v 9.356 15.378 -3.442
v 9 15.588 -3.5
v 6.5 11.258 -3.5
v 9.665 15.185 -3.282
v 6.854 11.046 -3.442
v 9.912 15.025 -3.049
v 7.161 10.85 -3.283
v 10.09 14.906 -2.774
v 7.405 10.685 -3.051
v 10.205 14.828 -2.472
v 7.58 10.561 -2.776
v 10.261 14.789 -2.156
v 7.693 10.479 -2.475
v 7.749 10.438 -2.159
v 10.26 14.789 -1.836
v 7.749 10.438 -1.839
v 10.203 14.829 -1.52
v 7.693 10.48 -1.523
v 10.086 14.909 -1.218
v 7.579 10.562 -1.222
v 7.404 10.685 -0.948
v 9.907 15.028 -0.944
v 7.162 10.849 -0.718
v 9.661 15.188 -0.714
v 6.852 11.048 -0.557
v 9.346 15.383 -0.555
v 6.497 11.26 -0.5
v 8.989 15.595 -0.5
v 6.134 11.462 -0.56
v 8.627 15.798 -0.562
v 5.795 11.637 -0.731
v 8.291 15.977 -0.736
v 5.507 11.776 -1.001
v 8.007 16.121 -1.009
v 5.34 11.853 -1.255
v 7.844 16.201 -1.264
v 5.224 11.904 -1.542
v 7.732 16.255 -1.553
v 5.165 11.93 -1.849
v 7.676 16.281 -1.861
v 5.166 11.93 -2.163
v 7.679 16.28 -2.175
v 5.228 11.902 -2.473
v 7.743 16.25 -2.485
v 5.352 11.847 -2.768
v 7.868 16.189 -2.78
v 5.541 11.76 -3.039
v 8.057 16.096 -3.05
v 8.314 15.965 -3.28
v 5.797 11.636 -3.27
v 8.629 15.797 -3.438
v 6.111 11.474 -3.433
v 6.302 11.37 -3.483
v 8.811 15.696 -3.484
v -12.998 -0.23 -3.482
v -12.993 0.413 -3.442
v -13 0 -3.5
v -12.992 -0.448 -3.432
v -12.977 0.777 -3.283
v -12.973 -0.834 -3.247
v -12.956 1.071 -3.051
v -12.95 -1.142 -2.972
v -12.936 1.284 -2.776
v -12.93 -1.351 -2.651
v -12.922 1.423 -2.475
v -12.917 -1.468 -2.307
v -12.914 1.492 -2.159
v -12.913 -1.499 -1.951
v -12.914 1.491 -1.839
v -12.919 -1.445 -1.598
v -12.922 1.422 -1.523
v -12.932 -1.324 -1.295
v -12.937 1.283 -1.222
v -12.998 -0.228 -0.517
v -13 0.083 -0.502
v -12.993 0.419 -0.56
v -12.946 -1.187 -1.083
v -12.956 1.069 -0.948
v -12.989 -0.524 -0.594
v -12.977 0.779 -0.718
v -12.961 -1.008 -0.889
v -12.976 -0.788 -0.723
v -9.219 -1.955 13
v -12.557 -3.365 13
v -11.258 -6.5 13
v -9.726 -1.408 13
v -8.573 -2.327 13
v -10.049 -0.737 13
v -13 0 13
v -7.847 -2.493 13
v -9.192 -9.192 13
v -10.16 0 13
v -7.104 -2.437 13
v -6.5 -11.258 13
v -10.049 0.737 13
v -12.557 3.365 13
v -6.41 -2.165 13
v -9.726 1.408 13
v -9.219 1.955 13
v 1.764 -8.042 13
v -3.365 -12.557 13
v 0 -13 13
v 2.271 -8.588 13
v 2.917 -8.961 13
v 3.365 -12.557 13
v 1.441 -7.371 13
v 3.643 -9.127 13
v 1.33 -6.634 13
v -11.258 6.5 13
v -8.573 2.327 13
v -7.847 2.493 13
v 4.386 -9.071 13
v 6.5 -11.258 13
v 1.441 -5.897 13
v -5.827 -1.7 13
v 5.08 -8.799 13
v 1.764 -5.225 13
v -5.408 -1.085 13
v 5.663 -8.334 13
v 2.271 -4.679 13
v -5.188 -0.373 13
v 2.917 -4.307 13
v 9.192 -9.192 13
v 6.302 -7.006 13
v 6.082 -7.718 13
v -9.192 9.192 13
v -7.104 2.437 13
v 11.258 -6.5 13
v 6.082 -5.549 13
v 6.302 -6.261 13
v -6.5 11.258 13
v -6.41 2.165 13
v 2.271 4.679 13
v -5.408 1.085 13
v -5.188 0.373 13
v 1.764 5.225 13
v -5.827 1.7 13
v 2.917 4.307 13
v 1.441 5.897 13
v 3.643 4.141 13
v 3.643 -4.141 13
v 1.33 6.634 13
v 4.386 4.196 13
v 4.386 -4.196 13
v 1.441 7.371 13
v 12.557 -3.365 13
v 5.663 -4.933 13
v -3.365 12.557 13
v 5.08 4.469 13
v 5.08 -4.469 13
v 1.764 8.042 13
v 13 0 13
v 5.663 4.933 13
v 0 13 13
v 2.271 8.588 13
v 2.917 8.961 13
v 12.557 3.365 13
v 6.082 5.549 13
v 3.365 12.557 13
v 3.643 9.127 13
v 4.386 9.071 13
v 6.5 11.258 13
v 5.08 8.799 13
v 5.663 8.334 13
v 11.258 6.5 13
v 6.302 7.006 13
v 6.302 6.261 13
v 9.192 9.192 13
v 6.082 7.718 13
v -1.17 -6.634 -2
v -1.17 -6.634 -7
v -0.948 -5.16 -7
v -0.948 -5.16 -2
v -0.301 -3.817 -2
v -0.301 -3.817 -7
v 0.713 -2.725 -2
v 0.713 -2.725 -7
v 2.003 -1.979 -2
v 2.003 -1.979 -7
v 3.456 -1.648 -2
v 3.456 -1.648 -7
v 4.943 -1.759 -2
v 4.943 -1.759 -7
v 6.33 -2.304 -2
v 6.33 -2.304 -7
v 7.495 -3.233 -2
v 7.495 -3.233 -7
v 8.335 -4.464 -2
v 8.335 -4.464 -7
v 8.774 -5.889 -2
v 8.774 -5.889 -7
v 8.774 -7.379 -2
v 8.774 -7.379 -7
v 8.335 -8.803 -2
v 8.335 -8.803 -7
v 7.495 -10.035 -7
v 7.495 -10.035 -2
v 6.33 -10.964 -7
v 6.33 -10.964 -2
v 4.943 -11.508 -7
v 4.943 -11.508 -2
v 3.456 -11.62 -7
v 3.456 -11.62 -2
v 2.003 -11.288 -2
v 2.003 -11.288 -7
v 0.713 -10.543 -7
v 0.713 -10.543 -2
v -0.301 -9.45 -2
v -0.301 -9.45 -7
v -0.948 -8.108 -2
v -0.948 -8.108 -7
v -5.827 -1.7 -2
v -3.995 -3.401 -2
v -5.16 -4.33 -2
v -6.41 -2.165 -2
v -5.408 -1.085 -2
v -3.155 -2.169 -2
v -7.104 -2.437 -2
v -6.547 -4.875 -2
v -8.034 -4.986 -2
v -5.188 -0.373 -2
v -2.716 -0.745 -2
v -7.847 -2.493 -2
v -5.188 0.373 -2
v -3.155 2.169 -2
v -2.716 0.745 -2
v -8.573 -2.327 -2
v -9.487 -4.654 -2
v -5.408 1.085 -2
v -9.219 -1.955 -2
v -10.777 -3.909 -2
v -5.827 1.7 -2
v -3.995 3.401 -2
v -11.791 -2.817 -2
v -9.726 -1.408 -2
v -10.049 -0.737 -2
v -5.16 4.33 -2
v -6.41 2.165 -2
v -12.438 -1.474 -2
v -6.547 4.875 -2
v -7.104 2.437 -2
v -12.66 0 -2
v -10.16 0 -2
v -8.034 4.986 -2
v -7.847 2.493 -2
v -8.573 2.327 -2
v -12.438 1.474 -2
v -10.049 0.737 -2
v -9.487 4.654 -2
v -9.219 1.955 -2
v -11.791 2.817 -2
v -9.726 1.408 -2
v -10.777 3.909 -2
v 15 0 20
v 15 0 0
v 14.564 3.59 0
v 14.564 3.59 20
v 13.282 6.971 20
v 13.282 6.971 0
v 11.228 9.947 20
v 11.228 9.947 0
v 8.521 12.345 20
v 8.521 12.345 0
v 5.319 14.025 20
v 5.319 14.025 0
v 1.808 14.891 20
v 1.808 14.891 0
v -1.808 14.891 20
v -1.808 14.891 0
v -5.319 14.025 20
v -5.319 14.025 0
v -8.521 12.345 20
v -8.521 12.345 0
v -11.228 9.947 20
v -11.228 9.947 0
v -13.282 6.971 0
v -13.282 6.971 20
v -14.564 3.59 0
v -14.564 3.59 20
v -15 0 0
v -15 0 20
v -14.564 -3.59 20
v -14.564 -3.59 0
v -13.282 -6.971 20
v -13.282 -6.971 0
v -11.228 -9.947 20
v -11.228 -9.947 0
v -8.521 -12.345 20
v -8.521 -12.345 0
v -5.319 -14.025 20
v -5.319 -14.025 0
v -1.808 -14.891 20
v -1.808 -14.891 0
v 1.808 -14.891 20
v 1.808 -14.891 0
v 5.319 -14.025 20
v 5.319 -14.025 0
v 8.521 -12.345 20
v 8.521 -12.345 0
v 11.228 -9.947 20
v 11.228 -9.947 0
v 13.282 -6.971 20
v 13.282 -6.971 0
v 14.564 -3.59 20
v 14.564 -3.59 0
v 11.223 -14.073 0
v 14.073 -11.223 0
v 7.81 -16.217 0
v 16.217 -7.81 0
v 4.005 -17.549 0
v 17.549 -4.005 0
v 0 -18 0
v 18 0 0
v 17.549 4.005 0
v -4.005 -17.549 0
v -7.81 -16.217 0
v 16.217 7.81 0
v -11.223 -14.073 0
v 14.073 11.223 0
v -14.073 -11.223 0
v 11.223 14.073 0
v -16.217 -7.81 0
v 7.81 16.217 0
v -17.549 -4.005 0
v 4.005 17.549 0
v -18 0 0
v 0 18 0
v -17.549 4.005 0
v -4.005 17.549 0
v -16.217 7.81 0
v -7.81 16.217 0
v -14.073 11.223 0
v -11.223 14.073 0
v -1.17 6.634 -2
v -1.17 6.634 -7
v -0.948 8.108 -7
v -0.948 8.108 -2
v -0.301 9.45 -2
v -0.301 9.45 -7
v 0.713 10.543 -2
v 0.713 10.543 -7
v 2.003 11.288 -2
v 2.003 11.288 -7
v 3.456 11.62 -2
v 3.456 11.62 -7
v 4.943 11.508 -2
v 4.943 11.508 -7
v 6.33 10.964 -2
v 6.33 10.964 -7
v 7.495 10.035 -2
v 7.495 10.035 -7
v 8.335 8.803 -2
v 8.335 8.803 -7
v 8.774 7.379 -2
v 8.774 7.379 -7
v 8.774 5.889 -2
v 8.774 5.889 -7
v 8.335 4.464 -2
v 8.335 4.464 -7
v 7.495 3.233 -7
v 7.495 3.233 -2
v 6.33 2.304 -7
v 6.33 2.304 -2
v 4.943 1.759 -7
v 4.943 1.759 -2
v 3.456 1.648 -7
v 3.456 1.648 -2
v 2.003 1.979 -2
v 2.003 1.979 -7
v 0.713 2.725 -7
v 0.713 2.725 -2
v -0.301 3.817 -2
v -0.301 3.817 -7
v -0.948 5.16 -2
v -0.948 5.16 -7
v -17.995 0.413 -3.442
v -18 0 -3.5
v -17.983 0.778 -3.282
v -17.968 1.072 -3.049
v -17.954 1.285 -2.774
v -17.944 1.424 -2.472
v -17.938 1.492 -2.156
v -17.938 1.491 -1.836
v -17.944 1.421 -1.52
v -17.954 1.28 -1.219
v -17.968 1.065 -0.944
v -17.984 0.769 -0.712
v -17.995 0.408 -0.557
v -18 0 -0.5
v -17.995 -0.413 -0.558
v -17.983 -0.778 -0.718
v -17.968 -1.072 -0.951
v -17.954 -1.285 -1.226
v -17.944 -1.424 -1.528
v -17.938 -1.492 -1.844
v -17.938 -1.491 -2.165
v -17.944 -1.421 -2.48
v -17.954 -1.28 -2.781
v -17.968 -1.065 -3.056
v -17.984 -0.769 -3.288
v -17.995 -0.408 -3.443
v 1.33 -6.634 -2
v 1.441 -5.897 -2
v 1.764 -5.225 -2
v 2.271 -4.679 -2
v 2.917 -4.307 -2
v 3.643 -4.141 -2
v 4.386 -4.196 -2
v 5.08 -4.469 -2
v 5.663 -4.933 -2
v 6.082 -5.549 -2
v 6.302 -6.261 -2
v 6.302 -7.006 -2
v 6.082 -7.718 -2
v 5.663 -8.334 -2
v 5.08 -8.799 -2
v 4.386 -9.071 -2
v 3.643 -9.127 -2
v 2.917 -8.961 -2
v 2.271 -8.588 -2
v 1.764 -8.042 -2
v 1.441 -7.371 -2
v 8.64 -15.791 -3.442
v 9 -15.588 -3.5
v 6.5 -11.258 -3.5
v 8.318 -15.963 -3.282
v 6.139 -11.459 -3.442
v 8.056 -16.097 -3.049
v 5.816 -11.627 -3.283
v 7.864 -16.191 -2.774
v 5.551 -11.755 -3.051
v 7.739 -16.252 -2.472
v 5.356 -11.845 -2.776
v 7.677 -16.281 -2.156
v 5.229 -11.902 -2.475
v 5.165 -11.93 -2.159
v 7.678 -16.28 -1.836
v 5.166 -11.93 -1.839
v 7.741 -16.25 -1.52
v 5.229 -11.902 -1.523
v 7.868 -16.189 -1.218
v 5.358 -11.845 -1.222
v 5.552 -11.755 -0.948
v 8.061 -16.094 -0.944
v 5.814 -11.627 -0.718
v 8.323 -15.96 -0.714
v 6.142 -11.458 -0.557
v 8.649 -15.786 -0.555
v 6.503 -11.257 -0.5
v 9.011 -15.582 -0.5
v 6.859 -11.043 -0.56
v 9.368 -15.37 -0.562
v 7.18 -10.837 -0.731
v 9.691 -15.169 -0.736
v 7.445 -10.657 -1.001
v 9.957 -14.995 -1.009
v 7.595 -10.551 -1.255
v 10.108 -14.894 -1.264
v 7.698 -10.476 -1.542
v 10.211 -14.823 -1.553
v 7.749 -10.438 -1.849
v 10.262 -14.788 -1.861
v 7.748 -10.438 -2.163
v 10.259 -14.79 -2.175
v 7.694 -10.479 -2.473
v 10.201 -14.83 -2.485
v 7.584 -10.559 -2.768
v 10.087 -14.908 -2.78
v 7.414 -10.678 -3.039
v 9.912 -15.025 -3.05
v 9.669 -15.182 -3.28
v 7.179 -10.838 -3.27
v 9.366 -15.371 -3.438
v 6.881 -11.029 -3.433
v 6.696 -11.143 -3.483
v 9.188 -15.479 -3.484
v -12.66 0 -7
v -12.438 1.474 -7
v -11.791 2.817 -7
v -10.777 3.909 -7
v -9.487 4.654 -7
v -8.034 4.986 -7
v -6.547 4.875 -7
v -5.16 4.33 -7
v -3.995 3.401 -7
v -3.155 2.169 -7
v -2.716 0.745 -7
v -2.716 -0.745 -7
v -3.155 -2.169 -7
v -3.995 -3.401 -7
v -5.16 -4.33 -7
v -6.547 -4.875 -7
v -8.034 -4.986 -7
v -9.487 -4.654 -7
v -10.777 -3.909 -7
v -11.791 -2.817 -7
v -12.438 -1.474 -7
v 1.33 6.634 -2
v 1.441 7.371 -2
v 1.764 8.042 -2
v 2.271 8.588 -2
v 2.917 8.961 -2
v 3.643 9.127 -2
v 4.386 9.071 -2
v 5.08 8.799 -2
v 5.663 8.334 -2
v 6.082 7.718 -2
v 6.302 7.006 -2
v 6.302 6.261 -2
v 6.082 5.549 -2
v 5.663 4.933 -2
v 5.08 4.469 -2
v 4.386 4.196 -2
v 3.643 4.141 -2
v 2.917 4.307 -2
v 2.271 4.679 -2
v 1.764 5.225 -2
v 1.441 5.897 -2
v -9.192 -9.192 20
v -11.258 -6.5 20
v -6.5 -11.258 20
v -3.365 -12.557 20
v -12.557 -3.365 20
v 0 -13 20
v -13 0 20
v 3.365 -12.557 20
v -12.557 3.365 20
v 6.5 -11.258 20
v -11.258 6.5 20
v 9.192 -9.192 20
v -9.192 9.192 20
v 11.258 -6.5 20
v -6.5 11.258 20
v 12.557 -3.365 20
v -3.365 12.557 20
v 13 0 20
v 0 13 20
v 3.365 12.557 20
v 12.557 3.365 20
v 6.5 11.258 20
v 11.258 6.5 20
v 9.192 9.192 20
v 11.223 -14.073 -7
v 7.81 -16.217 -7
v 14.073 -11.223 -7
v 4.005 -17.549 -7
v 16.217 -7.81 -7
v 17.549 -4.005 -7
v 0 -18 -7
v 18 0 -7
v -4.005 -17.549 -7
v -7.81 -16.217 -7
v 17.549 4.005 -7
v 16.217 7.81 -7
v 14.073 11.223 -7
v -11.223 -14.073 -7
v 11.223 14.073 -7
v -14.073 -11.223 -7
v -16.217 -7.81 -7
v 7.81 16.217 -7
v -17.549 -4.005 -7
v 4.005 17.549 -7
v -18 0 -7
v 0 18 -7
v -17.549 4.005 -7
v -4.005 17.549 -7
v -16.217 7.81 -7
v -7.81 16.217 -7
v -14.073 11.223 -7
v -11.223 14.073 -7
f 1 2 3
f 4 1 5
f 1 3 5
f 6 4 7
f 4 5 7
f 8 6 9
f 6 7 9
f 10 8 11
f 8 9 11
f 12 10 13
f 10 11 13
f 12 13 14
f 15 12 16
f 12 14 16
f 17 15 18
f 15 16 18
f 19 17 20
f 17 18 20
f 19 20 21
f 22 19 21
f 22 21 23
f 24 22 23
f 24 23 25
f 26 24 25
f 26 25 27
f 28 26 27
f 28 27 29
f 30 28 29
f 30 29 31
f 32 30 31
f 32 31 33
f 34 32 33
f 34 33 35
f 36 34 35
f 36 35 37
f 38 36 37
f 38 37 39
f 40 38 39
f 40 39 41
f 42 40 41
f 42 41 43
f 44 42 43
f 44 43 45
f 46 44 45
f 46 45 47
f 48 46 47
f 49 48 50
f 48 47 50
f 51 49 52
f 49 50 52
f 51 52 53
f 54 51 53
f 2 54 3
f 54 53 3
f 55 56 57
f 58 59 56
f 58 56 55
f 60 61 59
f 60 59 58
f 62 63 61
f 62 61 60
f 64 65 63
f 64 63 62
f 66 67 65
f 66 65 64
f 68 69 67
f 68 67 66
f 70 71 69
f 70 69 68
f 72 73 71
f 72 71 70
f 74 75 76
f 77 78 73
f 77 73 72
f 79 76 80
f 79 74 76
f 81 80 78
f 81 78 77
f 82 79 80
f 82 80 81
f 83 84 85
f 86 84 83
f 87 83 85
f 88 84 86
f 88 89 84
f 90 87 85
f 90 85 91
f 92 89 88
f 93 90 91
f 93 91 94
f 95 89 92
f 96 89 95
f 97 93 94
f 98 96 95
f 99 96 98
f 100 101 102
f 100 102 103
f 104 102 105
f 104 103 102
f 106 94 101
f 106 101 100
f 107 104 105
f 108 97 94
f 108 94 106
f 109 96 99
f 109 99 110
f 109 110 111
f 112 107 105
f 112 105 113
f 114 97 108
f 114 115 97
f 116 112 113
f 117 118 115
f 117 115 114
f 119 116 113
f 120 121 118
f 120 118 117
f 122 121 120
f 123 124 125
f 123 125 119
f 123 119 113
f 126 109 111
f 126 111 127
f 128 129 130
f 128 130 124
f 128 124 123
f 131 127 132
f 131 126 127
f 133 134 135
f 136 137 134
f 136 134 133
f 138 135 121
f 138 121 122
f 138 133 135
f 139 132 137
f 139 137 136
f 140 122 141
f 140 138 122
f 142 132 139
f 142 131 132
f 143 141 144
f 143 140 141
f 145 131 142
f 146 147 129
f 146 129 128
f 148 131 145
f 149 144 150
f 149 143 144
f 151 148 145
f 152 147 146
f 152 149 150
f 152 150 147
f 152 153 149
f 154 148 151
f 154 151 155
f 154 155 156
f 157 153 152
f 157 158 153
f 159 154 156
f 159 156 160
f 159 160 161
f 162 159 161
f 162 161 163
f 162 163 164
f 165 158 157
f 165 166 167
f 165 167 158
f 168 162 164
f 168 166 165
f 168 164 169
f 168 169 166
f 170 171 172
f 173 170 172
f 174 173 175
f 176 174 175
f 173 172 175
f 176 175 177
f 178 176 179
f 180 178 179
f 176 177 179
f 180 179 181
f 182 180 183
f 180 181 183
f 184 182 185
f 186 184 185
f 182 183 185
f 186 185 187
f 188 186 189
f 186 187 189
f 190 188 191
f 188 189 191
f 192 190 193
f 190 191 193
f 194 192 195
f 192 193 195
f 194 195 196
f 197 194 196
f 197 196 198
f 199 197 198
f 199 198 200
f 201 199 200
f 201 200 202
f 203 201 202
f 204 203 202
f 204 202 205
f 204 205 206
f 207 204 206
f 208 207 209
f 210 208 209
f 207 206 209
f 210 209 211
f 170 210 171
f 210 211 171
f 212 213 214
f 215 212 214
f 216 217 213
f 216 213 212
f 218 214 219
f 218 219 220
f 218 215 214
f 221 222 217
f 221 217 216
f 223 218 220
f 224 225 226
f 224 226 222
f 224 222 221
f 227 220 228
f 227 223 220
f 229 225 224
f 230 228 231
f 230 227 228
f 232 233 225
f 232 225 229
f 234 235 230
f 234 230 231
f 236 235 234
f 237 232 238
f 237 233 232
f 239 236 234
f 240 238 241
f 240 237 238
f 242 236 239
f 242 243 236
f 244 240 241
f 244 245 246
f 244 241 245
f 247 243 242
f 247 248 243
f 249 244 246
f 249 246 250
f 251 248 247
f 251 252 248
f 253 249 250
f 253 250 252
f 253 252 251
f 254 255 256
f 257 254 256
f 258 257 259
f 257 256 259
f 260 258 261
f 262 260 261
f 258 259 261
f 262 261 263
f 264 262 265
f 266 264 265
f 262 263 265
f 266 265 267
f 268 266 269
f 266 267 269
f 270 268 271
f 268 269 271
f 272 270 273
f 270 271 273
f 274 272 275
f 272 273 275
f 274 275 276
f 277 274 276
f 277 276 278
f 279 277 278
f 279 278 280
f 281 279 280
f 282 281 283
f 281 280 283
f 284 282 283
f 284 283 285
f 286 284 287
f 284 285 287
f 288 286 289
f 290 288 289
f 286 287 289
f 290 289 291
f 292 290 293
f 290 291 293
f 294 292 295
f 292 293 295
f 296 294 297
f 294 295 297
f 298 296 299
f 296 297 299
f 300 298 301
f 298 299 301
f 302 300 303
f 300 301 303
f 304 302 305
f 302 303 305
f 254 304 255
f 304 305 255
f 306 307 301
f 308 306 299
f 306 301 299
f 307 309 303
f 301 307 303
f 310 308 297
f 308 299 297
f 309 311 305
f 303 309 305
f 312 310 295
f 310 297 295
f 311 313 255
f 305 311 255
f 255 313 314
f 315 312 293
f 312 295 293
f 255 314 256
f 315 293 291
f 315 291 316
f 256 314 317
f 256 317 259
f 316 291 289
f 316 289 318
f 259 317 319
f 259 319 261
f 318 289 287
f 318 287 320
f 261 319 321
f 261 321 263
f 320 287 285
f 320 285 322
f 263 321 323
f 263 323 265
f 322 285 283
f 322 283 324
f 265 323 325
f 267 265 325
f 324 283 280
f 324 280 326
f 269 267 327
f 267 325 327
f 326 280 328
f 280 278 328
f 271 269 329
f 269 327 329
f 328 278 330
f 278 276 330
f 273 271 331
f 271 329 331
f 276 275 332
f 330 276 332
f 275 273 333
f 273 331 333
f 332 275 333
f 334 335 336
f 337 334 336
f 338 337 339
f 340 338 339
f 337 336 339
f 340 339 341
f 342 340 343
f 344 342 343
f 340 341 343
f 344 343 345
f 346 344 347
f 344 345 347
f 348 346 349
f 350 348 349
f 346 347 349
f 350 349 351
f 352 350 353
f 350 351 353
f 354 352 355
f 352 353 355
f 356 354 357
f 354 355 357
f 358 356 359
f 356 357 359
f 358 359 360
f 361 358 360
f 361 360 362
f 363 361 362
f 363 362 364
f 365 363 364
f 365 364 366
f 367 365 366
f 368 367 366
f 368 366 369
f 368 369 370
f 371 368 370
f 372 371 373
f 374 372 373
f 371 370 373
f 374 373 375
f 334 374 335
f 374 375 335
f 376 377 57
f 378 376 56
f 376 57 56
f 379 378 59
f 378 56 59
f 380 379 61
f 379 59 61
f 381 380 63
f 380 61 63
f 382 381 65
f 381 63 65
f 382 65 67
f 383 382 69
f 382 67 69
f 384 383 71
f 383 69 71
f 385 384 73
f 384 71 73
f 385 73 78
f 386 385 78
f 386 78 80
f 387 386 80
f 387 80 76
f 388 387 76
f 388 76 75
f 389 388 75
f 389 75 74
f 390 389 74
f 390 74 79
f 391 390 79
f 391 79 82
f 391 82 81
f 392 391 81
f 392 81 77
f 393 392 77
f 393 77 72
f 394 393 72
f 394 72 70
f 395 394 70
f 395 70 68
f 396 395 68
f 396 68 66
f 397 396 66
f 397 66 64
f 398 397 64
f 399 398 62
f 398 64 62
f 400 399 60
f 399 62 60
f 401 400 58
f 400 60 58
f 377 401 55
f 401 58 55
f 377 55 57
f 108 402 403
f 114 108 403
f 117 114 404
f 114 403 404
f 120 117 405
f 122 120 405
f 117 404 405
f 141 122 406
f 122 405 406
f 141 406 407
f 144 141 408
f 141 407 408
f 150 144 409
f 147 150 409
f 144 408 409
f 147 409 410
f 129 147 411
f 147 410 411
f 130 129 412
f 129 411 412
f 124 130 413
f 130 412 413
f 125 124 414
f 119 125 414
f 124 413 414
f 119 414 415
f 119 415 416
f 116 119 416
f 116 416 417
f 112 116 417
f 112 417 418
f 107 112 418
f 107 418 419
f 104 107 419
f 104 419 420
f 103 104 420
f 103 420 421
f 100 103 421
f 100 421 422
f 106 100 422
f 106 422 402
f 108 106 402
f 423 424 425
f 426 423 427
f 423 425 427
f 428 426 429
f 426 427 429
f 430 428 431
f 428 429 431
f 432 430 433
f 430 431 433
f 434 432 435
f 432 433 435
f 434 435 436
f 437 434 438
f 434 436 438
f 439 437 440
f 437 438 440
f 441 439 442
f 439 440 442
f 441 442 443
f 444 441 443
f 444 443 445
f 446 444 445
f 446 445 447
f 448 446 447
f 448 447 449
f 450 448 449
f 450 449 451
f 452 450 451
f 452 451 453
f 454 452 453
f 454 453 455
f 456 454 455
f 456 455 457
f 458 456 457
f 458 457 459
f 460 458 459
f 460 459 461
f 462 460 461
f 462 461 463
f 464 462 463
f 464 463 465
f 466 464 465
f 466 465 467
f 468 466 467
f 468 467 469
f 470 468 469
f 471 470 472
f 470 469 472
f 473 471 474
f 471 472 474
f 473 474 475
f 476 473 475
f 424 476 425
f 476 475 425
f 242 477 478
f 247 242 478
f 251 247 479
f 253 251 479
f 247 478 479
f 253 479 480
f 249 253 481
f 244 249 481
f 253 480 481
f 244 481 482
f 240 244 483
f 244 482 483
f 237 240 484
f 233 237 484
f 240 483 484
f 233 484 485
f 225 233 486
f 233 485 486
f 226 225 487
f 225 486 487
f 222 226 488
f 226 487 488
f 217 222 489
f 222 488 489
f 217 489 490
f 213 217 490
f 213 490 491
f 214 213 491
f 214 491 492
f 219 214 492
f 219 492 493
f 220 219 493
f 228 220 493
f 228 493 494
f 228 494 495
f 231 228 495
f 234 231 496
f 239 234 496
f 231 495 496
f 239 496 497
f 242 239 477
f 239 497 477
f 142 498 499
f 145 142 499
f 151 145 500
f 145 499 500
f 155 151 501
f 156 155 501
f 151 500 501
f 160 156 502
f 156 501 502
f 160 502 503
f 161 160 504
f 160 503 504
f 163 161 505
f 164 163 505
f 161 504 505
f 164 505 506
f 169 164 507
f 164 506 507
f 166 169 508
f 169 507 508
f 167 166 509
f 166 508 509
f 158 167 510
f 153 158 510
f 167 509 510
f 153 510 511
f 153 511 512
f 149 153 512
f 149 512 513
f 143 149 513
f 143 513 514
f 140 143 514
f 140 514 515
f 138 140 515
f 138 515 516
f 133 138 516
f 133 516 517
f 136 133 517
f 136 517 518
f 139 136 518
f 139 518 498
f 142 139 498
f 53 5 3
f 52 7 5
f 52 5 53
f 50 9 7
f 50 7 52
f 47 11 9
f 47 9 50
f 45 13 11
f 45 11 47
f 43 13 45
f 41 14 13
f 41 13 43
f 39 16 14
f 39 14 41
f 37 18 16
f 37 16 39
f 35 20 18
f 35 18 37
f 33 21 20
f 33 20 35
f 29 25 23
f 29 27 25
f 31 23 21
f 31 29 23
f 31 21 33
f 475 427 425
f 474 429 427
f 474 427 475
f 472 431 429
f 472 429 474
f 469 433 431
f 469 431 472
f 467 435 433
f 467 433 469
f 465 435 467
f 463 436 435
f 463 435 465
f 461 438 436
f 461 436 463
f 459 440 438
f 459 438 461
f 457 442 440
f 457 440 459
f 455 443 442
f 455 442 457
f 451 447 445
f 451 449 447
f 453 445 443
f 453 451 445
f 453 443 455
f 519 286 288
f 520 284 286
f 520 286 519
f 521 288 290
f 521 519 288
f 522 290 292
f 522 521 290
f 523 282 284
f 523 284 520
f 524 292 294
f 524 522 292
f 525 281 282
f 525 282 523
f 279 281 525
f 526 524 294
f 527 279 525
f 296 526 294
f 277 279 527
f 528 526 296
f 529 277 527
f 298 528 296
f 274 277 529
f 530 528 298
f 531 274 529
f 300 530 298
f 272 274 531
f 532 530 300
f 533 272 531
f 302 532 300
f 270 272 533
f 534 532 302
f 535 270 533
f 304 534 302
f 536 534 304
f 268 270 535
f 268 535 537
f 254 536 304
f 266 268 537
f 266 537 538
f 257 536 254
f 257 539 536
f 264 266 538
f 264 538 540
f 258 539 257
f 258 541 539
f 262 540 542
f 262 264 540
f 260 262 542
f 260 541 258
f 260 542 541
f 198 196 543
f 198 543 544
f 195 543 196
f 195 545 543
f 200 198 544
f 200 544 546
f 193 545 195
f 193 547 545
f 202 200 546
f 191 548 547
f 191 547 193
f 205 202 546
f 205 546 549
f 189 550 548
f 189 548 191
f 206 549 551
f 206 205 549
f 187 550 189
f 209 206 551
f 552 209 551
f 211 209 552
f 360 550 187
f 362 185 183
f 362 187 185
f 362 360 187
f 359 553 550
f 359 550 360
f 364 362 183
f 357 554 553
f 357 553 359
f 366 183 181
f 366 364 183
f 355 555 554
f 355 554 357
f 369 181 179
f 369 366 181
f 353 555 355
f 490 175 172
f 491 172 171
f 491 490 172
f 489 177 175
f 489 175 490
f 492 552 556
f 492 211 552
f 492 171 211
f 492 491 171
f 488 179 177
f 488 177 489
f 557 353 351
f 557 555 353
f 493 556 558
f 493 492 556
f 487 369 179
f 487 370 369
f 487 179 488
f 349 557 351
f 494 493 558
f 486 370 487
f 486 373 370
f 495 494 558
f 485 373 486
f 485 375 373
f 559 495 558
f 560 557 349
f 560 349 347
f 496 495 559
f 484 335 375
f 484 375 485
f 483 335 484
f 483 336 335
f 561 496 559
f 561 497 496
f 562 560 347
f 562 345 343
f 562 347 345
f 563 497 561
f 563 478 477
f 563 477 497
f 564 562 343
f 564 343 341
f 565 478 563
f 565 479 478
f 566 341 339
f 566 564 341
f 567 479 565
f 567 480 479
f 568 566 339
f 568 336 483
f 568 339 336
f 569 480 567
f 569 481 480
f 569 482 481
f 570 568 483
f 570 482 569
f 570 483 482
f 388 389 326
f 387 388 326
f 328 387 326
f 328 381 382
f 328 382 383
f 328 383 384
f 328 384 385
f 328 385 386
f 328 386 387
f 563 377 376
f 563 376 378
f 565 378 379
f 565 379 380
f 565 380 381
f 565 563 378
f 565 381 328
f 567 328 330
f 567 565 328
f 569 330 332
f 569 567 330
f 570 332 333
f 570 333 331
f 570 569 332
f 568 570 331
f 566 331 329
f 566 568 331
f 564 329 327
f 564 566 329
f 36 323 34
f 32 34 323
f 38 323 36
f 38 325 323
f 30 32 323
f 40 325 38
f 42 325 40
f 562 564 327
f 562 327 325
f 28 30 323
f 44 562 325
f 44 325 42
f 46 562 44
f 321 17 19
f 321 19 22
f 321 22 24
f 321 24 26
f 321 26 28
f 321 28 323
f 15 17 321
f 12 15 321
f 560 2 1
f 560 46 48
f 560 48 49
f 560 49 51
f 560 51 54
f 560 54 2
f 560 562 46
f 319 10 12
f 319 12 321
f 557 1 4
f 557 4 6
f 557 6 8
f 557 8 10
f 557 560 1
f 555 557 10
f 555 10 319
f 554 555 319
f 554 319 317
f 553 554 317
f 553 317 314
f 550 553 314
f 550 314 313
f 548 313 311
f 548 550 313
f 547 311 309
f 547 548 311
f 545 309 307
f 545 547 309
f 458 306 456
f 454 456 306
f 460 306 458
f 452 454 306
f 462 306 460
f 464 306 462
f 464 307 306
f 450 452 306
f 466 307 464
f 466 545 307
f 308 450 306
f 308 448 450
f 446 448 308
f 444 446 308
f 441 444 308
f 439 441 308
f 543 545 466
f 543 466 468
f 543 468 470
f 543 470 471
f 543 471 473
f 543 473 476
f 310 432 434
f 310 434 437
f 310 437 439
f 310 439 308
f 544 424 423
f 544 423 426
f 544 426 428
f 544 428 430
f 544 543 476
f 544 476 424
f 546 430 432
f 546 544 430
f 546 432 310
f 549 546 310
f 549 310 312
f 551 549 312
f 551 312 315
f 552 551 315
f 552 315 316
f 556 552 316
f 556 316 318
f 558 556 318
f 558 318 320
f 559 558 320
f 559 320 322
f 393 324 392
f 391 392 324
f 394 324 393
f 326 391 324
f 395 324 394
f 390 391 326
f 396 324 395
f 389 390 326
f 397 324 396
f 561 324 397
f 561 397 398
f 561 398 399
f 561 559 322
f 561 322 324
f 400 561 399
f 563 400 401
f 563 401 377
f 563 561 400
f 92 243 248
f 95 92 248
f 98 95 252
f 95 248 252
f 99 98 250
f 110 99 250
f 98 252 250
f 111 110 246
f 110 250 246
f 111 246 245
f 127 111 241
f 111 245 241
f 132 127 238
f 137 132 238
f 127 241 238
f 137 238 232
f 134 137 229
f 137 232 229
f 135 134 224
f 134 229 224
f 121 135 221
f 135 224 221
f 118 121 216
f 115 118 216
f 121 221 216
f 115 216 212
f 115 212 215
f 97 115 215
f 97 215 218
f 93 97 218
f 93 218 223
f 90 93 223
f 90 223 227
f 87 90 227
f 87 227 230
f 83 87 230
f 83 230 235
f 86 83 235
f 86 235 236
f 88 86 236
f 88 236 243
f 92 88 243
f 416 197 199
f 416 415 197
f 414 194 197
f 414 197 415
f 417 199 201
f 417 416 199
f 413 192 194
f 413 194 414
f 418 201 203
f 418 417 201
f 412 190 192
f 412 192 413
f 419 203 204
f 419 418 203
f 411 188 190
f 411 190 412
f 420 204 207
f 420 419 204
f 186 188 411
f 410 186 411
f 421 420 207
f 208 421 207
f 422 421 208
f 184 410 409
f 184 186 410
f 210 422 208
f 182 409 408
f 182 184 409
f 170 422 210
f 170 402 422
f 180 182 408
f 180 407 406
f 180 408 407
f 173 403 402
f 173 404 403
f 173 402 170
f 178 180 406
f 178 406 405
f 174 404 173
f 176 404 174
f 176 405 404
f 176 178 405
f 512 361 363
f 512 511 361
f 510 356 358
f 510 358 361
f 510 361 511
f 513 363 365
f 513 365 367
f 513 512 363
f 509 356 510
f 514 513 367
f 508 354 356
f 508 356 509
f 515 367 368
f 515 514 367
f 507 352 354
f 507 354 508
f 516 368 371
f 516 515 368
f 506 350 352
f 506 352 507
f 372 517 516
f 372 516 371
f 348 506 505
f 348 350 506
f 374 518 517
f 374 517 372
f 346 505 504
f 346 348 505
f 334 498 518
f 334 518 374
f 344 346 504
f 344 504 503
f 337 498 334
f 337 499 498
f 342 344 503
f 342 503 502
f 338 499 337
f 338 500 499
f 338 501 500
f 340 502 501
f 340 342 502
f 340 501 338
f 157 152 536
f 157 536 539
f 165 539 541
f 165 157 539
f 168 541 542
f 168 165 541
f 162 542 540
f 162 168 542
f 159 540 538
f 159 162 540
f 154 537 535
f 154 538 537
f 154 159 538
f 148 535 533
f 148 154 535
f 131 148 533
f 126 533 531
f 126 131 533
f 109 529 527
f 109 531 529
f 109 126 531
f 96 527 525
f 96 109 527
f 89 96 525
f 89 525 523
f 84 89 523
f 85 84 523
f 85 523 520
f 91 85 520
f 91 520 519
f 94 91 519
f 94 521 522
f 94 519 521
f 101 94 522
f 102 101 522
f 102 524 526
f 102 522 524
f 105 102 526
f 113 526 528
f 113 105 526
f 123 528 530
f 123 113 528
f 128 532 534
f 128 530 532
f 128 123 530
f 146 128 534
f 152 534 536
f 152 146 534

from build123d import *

# Parameters (mm, degrees)
SKETCH1_R                = 15
BOSS_EXTRUDE1_DEPTH      = 20
SKETCH2_R                = 10.95
BOSS_EXTRUDE2_DEPTH      = 3.5
SKETCH4_R                = 3.05
CUT_EXTRUDE1_DEPTH       = 4.1
SKETCH5_R                = 1.5
CUT_EXTRUDE2_DEPTH       = 4
SKETCH7_R                = 10.95
SKETCH7_R_2              = 3
BOSS_EXTRUDE3_DEPTH      = 11
SKETCH9_R                = 1.5
CUT_EXTRUDE4_DEPTH       = 41.5
BOSS_EXTRUDE4_START      = 7
SKETCH12_R               = 18
SKETCH12_R_2             = 3.25
SKETCH12_R_3             = 3.05
BOSS_EXTRUDE4_DEPTH      = 7
CUT_EXTRUDE9_START       = -5
SKETCH13_R               = 1.5
CUT_EXTRUDE9_DEPTH       = 17
CIRPATTERN1_COUNT        = 3
CUT_EXTRUDE12_DEPTH      = 15
CUT_EXTRUDE12_DEPTH_BACK = 38.1079508
SKETCH15_R               = 13
SKETCH15_R_2             = 10.95
BOSS_EXTRUDE6_START      = 13
SKETCH17_R               = 13
BOSS_EXTRUDE6_DEPTH      = 20
SKETCH19_R               = 2.5
CUT_EXTRUDE13_DEPTH      = 38.107950728
SKETCH20_R               = 5
SKETCH20_R_2             = 2.5
CUT_EXTRUDE14_DEPTH      = 5


with BuildPart() as part:
    # Sketch1 → Boss-Extrude1 (new body)
    with BuildSketch(Plane.XY):
        Circle(SKETCH1_R)
    extrude(amount=BOSS_EXTRUDE1_DEPTH)

    # Sketch2 → Boss-Extrude2 (add)
    with BuildSketch(Plane.XY.offset(20)):
        Circle(SKETCH2_R)
    extrude(amount=BOSS_EXTRUDE2_DEPTH)

    # Sketch4 → Cut-Extrude1 (cut)
    with BuildSketch(Plane(origin=(0, 0, 0), x_dir=(-1, 0, 0), z_dir=(0, 0, -1))):
        Circle(SKETCH4_R)
    extrude(amount=-CUT_EXTRUDE1_DEPTH, mode=Mode.SUBTRACT)

    # Sketch5 → Cut-Extrude2 (cut)
    with BuildSketch(Plane(origin=(0, 0, 4.1), x_dir=(-1, 0, 0), z_dir=(0, 0, -1))):
        Circle(SKETCH5_R)
    extrude(amount=-CUT_EXTRUDE2_DEPTH, mode=Mode.SUBTRACT)

    # Sketch7 → Boss-Extrude3 (add)
    with BuildSketch(Plane.XY.offset(23.5)):
        Circle(SKETCH7_R)
        Circle(SKETCH7_R_2, mode=Mode.SUBTRACT)
    extrude(amount=BOSS_EXTRUDE3_DEPTH)

    # Sketch9 → Cut-Extrude4 (cut, through all)
    with BuildSketch(Plane.XY.offset(34.5)):
        with Locations((7, 0)):
            Circle(SKETCH9_R)
        with Locations((-3.5, -6.062177826)):
            Circle(SKETCH9_R)
        with Locations((-3.5, 6.062177826)):
            Circle(SKETCH9_R)
    extrude(amount=-CUT_EXTRUDE4_DEPTH, mode=Mode.SUBTRACT)

    # Sketch12 → Boss-Extrude4 (add)
    with BuildSketch(Plane(origin=(0, 0, 0), x_dir=(-1, 0, 0), z_dir=(0, 0, -1)).offset(BOSS_EXTRUDE4_START)):
        Circle(SKETCH12_R)
        with Locations((3.5, 6.062177826)):
            Circle(SKETCH12_R_2, mode=Mode.SUBTRACT)
        with Locations((3.5, -6.062177826)):
            Circle(SKETCH12_R_2, mode=Mode.SUBTRACT)
        with Locations((-7, 0)):
            Circle(SKETCH12_R_2, mode=Mode.SUBTRACT)
        Circle(SKETCH12_R_3, mode=Mode.SUBTRACT)
    extrude(amount=-BOSS_EXTRUDE4_DEPTH)

    # Sketch13 → Cut-Extrude9 (cut)
    with BuildSketch(Plane(origin=(0, 0, 0), x_dir=(0, 0, -1), z_dir=(1, 0, 0)).offset(CUT_EXTRUDE9_START)):
        with Locations((2, 0)):
            Circle(SKETCH13_R)
    cut_extrude9 = extrude(amount=-CUT_EXTRUDE9_DEPTH, mode=Mode.SUBTRACT)

    # CirPattern1: Cut-Extrude9 ×3 about axis
    cirpattern1_axis = Axis((0, 0, 0), (0, 0, 1))
    for i in range(1, CIRPATTERN1_COUNT):
        add(cut_extrude9.rotate(cirpattern1_axis, i * 360 / CIRPATTERN1_COUNT), mode=Mode.SUBTRACT)

    # Sketch15 → Cut-Extrude12 (cut, two sides: drawn at the far end of the back side and taken through both)
    # profile 1 of 2: a face of its own
    with BuildSketch(Plane.XY.offset(20).offset(-CUT_EXTRUDE12_DEPTH_BACK)):
        Circle(SKETCH15_R)
        Circle(SKETCH15_R_2, mode=Mode.SUBTRACT)
    # profile 2 of 2: a face of its own
    with BuildSketch(Plane.XY.offset(20).offset(-CUT_EXTRUDE12_DEPTH_BACK)):
        Circle(SKETCH15_R_2)
    extrude(amount=CUT_EXTRUDE12_DEPTH + CUT_EXTRUDE12_DEPTH_BACK, mode=Mode.SUBTRACT)

    # Sketch17 → Boss-Extrude6 (add)
    with BuildSketch(Plane.XY.offset(BOSS_EXTRUDE6_START)):
        Circle(SKETCH17_R)
    extrude(amount=-BOSS_EXTRUDE6_DEPTH)

    # Sketch19 → Cut-Extrude13 (cut, through all)
    with BuildSketch(Plane(origin=(0, 0, -7), x_dir=(-1, 0, 0), z_dir=(0, 0, -1))):
        with Locations((7.66, 0)):
            Circle(SKETCH19_R)
        with Locations((-3.83, -6.633754593)):
            Circle(SKETCH19_R)
        with Locations((-3.83, 6.633754593)):
            Circle(SKETCH19_R)
    extrude(amount=-CUT_EXTRUDE13_DEPTH, mode=Mode.SUBTRACT)

    # Sketch20 → Cut-Extrude14 (cut)
    # profile 1 of 3: a face of its own
    with BuildSketch(Plane(origin=(0, 0, -7), x_dir=(-1, 0, 0), z_dir=(0, 0, -1))):
        with Locations((7.66, 0)):
            Circle(SKETCH20_R)
        with Locations((7.66, 0)):
            Circle(SKETCH20_R_2, mode=Mode.SUBTRACT)
    # profile 2 of 3: a face of its own
    with BuildSketch(Plane(origin=(0, 0, -7), x_dir=(-1, 0, 0), z_dir=(0, 0, -1))):
        with Locations((-3.83, 6.633754593)):
            Circle(SKETCH20_R)
        with Locations((-3.83, 6.633754593)):
            Circle(SKETCH20_R_2, mode=Mode.SUBTRACT)
    # profile 3 of 3: a face of its own
    with BuildSketch(Plane(origin=(0, 0, -7), x_dir=(-1, 0, 0), z_dir=(0, 0, -1))):
        with Locations((-3.83, -6.633754593)):
            Circle(SKETCH20_R)
        with Locations((-3.83, -6.633754593)):
            Circle(SKETCH20_R_2, mode=Mode.SUBTRACT)
    extrude(amount=-CUT_EXTRUDE14_DEPTH, mode=Mode.SUBTRACT)


solid = part.part
